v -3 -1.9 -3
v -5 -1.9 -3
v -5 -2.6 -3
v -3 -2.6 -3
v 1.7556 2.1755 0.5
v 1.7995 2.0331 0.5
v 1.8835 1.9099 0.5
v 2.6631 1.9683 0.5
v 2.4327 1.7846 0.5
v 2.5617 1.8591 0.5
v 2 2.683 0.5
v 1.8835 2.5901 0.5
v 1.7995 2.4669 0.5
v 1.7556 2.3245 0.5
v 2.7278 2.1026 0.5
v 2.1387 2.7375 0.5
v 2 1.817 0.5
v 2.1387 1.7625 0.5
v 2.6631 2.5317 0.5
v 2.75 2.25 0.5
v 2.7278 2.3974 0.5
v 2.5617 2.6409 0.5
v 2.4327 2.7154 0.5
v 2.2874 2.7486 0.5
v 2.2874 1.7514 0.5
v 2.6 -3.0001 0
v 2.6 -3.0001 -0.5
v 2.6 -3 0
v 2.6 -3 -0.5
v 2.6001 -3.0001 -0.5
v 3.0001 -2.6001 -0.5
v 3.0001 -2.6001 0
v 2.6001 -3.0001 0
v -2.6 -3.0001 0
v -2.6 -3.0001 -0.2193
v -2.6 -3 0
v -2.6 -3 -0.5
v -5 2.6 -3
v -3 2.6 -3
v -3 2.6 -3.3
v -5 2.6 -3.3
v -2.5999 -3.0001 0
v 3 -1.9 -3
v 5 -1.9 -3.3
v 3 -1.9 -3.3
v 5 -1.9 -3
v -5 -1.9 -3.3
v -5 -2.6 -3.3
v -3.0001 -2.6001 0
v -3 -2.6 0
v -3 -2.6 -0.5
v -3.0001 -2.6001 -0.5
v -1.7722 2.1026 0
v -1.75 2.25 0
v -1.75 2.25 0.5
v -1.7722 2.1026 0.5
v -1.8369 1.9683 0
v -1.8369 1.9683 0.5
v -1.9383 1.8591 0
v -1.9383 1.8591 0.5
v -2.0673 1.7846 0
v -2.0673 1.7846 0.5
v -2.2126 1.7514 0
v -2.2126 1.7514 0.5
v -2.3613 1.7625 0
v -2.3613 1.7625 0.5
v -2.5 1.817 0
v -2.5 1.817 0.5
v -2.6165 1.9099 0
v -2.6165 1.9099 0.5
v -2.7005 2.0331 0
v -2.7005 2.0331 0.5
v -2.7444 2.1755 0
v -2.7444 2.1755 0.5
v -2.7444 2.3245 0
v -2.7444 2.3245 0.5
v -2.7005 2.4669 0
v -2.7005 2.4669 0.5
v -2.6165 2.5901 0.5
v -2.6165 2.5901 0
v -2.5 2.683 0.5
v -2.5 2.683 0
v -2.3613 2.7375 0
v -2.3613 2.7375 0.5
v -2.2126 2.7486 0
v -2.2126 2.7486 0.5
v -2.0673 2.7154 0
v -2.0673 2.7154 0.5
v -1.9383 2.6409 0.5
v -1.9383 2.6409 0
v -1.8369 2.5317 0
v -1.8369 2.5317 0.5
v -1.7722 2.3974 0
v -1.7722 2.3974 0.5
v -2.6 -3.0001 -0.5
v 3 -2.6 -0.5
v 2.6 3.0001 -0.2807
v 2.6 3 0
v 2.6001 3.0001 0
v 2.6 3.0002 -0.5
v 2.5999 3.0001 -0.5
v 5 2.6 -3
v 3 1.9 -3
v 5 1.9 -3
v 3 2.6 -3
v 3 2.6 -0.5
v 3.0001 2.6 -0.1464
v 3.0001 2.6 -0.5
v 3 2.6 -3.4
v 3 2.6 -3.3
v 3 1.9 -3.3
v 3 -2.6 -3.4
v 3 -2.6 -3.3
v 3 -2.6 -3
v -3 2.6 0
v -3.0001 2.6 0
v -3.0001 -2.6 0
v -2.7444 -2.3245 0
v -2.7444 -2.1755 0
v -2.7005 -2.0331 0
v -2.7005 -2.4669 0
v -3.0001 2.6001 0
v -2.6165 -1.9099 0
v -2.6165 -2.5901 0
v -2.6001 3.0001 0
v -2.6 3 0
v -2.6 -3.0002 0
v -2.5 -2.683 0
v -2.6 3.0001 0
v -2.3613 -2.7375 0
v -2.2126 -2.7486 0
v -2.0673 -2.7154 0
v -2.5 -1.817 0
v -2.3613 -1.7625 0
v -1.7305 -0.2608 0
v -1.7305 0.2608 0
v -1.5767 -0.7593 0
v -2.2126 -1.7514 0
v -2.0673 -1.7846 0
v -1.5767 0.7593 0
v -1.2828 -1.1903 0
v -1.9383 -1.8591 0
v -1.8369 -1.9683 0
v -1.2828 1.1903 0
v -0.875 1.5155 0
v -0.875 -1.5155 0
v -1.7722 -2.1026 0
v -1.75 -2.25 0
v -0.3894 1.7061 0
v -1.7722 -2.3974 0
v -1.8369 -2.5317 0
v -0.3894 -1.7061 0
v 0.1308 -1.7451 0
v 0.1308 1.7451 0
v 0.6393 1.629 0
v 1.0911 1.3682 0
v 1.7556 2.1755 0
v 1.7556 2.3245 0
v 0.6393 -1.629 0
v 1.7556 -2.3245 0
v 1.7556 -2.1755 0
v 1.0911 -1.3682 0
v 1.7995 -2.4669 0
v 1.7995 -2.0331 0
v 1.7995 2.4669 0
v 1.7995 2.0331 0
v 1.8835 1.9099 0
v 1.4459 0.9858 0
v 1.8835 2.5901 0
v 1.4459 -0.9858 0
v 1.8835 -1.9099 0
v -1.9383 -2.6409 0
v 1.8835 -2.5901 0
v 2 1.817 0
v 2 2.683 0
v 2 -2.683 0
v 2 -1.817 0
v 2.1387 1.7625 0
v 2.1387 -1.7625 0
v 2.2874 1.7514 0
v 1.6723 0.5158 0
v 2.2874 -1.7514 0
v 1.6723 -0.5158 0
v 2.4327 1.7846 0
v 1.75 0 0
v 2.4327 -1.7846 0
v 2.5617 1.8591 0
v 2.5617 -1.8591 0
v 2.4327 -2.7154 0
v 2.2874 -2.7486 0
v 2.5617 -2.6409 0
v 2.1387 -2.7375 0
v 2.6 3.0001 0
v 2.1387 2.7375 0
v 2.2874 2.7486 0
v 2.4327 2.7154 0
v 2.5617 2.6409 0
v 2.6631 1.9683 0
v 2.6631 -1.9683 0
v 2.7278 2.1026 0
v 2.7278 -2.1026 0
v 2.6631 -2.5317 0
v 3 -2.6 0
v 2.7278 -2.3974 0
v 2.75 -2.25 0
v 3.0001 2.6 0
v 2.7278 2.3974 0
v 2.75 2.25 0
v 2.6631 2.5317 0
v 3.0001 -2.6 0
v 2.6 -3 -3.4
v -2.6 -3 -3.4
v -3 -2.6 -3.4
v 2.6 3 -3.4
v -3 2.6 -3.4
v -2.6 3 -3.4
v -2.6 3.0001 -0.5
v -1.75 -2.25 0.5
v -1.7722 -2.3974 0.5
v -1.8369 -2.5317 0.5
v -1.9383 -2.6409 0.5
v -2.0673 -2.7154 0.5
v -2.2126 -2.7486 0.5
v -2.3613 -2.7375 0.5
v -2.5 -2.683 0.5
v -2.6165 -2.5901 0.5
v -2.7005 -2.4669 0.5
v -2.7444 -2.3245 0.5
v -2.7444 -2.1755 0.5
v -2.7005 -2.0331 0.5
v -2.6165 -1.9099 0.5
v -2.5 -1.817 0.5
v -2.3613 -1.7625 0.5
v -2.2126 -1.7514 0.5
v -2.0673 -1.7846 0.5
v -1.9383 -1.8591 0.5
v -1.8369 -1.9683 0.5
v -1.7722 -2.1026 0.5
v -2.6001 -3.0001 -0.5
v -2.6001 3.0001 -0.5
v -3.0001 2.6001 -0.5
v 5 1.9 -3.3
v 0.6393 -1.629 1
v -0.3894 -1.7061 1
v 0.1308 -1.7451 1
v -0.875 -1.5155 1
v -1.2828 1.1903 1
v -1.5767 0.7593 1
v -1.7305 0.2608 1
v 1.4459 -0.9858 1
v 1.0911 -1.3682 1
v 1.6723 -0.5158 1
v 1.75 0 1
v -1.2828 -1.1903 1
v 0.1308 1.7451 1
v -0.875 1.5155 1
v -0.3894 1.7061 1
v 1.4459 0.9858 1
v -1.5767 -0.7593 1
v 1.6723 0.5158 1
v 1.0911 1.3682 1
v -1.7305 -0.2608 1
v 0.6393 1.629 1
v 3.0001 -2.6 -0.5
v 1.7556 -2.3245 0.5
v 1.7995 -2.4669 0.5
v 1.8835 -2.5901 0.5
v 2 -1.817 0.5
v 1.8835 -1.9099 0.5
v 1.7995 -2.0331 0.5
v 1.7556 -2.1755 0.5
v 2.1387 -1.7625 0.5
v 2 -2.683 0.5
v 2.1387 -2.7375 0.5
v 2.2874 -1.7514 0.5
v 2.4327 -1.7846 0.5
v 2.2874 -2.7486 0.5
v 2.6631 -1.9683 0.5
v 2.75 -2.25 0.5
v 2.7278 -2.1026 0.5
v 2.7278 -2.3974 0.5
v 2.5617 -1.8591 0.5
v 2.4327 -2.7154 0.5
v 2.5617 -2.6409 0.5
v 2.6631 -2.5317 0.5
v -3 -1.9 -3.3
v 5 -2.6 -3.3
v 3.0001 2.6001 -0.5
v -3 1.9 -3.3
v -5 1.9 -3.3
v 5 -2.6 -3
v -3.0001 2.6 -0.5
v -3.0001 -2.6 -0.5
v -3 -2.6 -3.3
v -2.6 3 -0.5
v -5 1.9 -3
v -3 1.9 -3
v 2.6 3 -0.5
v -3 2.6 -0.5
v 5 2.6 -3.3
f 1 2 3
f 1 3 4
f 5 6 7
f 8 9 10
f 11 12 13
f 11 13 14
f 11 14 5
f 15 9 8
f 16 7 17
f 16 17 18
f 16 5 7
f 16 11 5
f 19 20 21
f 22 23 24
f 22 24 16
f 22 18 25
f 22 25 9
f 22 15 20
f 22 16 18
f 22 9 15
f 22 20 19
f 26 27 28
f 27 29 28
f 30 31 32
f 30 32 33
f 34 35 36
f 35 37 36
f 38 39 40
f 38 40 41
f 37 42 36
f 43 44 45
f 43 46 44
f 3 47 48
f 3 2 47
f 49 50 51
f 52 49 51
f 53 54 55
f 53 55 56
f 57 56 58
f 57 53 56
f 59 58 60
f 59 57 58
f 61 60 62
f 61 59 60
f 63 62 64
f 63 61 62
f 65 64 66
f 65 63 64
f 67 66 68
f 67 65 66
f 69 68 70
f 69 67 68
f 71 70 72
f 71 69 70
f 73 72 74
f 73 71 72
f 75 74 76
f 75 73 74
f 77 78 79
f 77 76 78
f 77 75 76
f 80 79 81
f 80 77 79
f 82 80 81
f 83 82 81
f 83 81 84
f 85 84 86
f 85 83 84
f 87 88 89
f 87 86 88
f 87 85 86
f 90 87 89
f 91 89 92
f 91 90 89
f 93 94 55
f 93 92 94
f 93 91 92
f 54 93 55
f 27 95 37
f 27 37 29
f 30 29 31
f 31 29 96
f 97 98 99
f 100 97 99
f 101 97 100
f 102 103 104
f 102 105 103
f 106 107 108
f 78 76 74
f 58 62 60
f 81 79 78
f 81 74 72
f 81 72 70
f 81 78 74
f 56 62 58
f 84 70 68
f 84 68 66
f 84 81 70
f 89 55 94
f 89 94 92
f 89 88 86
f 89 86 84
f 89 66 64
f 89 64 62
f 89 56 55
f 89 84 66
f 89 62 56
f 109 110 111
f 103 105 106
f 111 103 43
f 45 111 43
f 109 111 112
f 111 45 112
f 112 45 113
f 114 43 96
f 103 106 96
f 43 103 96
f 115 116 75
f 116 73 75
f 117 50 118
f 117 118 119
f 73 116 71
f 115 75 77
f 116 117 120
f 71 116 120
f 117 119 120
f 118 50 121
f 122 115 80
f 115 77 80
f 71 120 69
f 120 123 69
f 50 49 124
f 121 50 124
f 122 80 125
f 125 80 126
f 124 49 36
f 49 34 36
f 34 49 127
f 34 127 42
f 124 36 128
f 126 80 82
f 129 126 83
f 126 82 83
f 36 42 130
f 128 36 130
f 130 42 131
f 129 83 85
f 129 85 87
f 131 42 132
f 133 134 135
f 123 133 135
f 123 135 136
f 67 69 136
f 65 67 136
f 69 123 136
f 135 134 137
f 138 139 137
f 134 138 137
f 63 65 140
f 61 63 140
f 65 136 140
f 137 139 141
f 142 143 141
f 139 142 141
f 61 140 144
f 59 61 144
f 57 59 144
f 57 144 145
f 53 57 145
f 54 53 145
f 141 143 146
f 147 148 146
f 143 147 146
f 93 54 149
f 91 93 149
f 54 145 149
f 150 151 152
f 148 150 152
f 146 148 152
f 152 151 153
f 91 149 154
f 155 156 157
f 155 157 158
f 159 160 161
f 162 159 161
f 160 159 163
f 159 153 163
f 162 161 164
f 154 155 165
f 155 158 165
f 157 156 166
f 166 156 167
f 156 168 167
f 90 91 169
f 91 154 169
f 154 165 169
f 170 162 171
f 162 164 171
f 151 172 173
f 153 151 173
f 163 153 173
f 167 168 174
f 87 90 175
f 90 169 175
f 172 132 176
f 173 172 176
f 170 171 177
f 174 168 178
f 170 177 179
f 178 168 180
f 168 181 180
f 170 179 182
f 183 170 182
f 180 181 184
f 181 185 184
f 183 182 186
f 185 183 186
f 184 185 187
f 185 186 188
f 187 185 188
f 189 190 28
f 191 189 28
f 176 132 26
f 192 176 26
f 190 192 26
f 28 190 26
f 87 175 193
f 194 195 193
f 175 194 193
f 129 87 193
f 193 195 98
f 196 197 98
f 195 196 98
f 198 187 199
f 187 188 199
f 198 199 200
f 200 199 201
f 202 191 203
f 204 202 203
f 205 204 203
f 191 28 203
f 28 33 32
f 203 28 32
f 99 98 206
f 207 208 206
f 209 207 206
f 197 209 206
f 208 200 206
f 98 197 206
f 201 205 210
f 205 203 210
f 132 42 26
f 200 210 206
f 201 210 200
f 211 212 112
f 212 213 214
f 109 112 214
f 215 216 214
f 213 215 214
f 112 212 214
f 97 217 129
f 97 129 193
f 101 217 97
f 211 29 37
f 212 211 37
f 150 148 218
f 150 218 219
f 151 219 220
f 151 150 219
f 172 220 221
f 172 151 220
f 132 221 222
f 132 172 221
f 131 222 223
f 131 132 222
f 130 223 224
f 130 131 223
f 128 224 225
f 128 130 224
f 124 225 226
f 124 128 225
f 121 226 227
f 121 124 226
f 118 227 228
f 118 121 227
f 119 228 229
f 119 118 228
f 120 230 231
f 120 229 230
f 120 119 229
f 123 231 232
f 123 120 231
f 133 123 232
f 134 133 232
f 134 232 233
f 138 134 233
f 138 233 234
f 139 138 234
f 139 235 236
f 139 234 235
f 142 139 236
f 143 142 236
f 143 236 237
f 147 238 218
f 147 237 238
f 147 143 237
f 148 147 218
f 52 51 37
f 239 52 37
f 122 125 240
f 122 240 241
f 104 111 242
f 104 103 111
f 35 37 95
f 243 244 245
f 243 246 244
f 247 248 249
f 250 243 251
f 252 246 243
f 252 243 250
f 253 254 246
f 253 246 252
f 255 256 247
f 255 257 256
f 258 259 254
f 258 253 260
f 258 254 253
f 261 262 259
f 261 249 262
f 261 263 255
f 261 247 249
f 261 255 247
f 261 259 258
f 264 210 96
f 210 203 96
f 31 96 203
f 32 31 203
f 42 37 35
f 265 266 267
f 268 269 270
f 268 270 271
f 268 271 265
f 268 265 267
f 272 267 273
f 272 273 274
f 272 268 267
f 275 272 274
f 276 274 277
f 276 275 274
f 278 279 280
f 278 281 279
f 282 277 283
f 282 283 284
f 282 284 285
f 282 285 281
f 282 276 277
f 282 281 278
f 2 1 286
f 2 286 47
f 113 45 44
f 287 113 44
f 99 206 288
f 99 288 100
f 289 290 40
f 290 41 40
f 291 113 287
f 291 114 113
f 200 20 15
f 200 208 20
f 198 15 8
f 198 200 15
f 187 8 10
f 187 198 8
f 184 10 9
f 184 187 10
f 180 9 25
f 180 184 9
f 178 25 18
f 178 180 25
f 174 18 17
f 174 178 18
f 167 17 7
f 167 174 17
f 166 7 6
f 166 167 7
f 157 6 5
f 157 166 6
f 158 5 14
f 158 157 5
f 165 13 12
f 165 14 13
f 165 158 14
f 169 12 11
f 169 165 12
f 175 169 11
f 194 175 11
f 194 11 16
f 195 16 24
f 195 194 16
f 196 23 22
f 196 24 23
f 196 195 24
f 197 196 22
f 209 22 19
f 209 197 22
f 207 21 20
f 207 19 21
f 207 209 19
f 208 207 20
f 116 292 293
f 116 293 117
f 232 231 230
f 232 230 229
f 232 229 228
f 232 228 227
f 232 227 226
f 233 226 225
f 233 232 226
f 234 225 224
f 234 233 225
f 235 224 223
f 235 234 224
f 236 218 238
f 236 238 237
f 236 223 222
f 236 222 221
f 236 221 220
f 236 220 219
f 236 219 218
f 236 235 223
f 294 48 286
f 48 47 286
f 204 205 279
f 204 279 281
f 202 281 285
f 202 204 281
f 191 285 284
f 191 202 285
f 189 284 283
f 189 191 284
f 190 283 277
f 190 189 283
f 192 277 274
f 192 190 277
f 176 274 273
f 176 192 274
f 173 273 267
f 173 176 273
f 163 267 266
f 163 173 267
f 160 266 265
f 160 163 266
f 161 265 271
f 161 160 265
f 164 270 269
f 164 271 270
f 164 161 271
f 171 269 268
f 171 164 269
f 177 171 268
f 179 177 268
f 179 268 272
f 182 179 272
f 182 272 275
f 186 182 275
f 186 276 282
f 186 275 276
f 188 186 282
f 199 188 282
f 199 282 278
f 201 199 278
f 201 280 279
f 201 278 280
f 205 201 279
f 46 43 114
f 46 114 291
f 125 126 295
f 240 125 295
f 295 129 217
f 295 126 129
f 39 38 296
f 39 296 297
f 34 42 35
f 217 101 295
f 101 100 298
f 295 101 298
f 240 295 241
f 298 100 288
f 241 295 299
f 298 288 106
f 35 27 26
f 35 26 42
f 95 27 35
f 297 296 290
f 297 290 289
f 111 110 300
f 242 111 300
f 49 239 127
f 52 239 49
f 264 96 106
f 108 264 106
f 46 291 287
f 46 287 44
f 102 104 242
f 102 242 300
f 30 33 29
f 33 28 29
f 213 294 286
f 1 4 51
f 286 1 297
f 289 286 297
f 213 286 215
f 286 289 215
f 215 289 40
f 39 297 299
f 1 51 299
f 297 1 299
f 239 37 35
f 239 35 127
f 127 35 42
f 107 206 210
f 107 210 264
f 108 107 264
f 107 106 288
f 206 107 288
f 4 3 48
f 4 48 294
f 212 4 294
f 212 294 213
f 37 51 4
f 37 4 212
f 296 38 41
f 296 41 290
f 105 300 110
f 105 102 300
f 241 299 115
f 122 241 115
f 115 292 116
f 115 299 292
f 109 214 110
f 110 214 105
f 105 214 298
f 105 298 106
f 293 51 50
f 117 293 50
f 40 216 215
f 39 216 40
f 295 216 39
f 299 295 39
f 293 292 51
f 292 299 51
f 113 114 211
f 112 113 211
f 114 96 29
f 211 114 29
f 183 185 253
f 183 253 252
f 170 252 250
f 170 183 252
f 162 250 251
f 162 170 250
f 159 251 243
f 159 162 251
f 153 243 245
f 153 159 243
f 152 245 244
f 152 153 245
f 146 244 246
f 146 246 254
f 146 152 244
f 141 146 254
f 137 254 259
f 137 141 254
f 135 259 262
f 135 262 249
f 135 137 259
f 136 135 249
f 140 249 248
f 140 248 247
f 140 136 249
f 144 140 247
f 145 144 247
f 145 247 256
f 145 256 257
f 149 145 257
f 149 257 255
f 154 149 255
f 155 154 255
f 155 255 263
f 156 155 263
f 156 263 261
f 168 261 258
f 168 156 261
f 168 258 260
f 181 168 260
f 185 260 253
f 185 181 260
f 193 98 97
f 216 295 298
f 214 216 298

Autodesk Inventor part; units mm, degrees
ref_plane "YZ Plane" through (0, 0, 0) normal (1, 0, 0) x (0, 1, 0)
ref_plane "XZ Plane" through (0, 0, 0) normal (0, 1, 0) x (-1, 0, 0)
sketch "Boceto1" plane through (0, 0, 0) normal (0, 0, 1) x (1, 0, 0)
  line L0 (-7.8, 0) -> (4.8, 0) projected
  line L1 (0, -4.2) -> (0, 4.2) projected
  line L2 (-2.6, 3) -> (2.6, 3)
  line L3 (3, 2.6) -> (3, -2.6)
  line L4 (2.6, -3) -> (-2.6, -3)
  line L5 (-3, -2.6) -> (-3, 2.6)
  circle A0 centre (-2.25, 2.25) radius 0.5
  circle A1 centre (-2.25, -2.25) radius 0.5
  circle A2 centre (2.25, 2.25) radius 0.5
  circle A3 centre (2.25, -2.25) radius 0.5
  circle A4 centre (0, 0) radius 1.75
  line L6 (-2.6, 3) -> (-3, 2.6)
  line L7 (2.6, 3) -> (3, 2.6)
  line L8 (3, -2.6) -> (2.6, -3)
  line L9 (-3, -2.6) -> (-2.6, -3)
  point P0 (-3, 3)
  point P1 (3, -3)
  point P2 (3, 3)
  point P3 (-3, -3)
  dimension "d0" = 6
  dimension "d1" = 6
  dimension "d2" = 4.5
  dimension "d4" = 4.5
  dimension "d5" = 1
  dimension "d6" = 3.5
  dimension "d7" = 0.4
  dimension "d8" = 0.4
  dimension "d9" = 0.4
  dimension "d10" = 0.4
  dimension "d11" = 0.4
  dimension "d12" = 0.4
  dimension "d13" = 0.4
  dimension "d14" = 0.4
extrude "Extrusión1" add sketch "Boceto1" against normal blind 3.4 contours L5 L6 L2 L1 A4 L0 | L0 A4 L1 L4 L9 L5 | A4 L1 L0 | L0 L1 A4 | L1 A4 L0 | L0 A4 L1 | L1 L2 L7 L3 L0 A4 | A4 L0 L3 L8 L4 L1 | A0 | A1 | A2 | A3
extrude "Extrusión2" add sketch "Boceto1" along normal blind 0.5 contours A0 | A1 | A2 | A3
extrude "Extrusión3" add sketch "Boceto1" along normal blind 1 contours A4 L1 L0 | L0 L1 A4 | L1 A4 L0 | L0 A4 L1
ref_plane "Plano de trabajo1" through (0, 0, -3) normal (0, 0, 1) x (1, 0, 0)
sketch "Boceto2" plane through (0, 0, -3) normal (0, 0, 1) x (1, 0, 0)
  line L0 (-3, 2.6) -> (-2.6, 3) projected
  line L1 (-2.6, 3) -> (2.6, 3) projected
  line L2 (2.6, 3) -> (3, 2.6) projected
  line L3 (3, 2.6) -> (3, -2.6) projected
  line L4 (3, -2.6) -> (2.6, -3) projected
  line L5 (2.6, -3) -> (-2.6, -3) projected
  line L6 (-2.6, -3) -> (-3, -2.6) projected
  line L7 (-3, -2.6) -> (-3, 2.6) projected
  line L8 (-3, 2.6) -> (-5, 2.6)
  line L9 (-5, 2.6) -> (-5, 1.9)
  line L10 (-5, 1.9) -> (-3, 1.9)
  line L11 (-3, 1.9) -> (-3, 2.6)
  line L12 (-5, 2.25) -> (-3, 2.25)
  line L13 (-7.8, 0) -> (4.8, 0) projected
  line L14 (0, -4.2) -> (0, 4.2) projected
  line L15 (-3, -1.9) -> (-5, -1.9)
  line L16 (-5, -1.9) -> (-5, -2.6)
  line L17 (-5, -2.6) -> (-3, -2.6)
  line L18 (-3, -2.6) -> (-3, -1.9)
  line L19 (5, 2.6) -> (3, 2.6)
  line L20 (3, 2.6) -> (3, 1.9)
  line L21 (3, 1.9) -> (5, 1.9)
  line L22 (5, 1.9) -> (5, 2.6)
  line L23 (5, -1.9) -> (3, -1.9)
  line L24 (3, -1.9) -> (3, -2.6)
  line L25 (3, -2.6) -> (5, -2.6)
  line L26 (5, -2.6) -> (5, -1.9)
  point P0 (0, 0)
  point P1 (-5, -2.25)
  point P2 (-3, -2.25)
  point P3 (3, 2.25)
  point P4 (5, 2.25)
  point P5 (3, -2.25)
  point P6 (5, -2.25)
  dimension "d22" = 2
  dimension "d23" = 0.7
  dimension "d24" = 0.75
  dimension "d27" = 4.5
  dimension "d30" = 8
extrude "Extrusión4" add sketch "Boceto2" against normal blind 0.3 contours L7 L12 L9 L8 | L7 L10 L9 L12 | L19 L22 L21 L3 | L7 L17 L16 L15 | L23 L26 L25 L3
sketch "Boceto3" plane through (-2.6, 3, 0) normal (0, 1, 0) x (1, 0, 0)
  line L0 (5.2, 0) -> (0, 0) projected
  line L1 (5.2, 0) -> (5.2, 3.4) projected
  line L2 (0, 3.4) -> (5.2, 3.4) projected
  line L3 (0, 0) -> (0, 3.4) projected
  line L4 (5.2, 0.5) -> (0, 0.5)
  line L5 (0, 0) -> (0, 3.4) projected
  point P0 (2.6, 0)
  dimension "d35" = 0.5
extrude "Extrusión5" add sketch "Boceto3" along normal blind 0.0001 contours L0 L3 L4 L1
mirror "Simetría1" about plane through (0, 0, 0) normal (0, 1, 0) of "Extrusión5"
sketch "Boceto4" plane through (3, -2.6, 0) normal (1, 0, 0) x (0, 0, -1)
  line L0 (3.3, 5.2) -> (3.3, 4.5) projected
  line L1 (3.3, 4.5) -> (3, 4.5) projected
  line L2 (3, 4.5) -> (3, 5.2) projected
  line L3 (0, 5.2) -> (3, 5.2) projected
  line L4 (0, 0) -> (0, 5.2) projected
  line L5 (0, 0) -> (3, 0) projected
  line L6 (3, 0) -> (3, 0.7) projected
  line L7 (3, 0.7) -> (3.3, 0.7) projected
  line L8 (3.3, 0.7) -> (3.3, 0) projected
  line L9 (3.3, 0) -> (3.4, 0) projected
  line L10 (3.4, 5.2) -> (3.4, 0) projected
  line L11 (3.3, 5.2) -> (3.4, 5.2) projected
  line L12 (0.5, 0) -> (0.5, 5.2)
  point P0 (0, 2.6)
  dimension "d38" = 0.5
extrude "Extrusión6" add sketch "Boceto4" along normal blind 0.0001 contours L12 L5 L4 L3
mirror "Simetría2" about plane through (0, 0, 0) normal (1, 0, 0) of "Extrusión6"
sketch "Boceto5" plane through (3, -2.6, -3) normal (0.7071, -0.7071, 0) x (-0.7071, -0.7071, 0)
  line L0 (0.5657, -2.5) -> (0, -2.5)
  line L1 (0, -2.5) -> (0, -3)
  line L2 (0, -3) -> (0, -2.5) projected
  line L3 (0, -3) -> (0.5657, -3)
  line L4 (0.5657, -3) -> (0, -3) projected
  line L5 (0.5657, -3) -> (0.5657, -2.5)
  line L6 (0.5657, -3) -> (0.5657, -2.5) projected
  point P0 (0.2828, -3)
extrude "Extrusión7" add sketch "Boceto5" along normal blind 0.0001
sketch "Boceto6" plane through (3, 2.6, -3.3) normal (0.7071, 0.7071, 0) x (-0.7071, 0.7071, 0)
  line L0 (-0.0001, 3.3) -> (0.5657, 3.3)
  line L1 (0.5657, 3.3) -> (0, 3.3) projected
  line L2 (0.5658, 3.3) -> (0.5658, 2.8) projected
  line L3 (0.5657, 3.3) -> (0.5658, 2.8)
  line L4 (0.5658, 2.8) -> (0, 2.8)
  line L5 (0, 2.8) -> (-0.0001, 3.3)
  point P0 (0.2828, 3.3)
extrude "Extrusión8" add sketch "Boceto6" along normal blind 0.0001
sketch "Boceto7" plane through (-3, -2.6, -3) normal (-0.7071, -0.7071, 0) x (-0.7071, 0.7071, 0)
  line L0 (0, -2.5) -> (-0.5657, -2.5)
  line L1 (-0.5658, -2.5) -> (-0.5658, -3) projected
  line L2 (-0.5657, -2.5) -> (-0.5658, -3)
  line L3 (-0.5658, -3) -> (0, -3)
  line L4 (0, -3) -> (-0.5657, -3) projected
  line L5 (0, -3) -> (0, -2.5)
  point P0 (-0.2828, -3)
extrude "Extrusión9" add sketch "Boceto7" along normal blind 0.0001
sketch "Boceto8" plane through (-3, 2.6, -3.3) normal (-0.7071, 0.7071, 0) x (-0.7071, -0.7071, 0)
  line L0 (0, 3.3) -> (-0.5657, 3.3)
  line L1 (-0.5657, 3.3) -> (0, 3.3) projected
  line L2 (-0.5657, 3.3) -> (-0.5657, 2.8)
  line L3 (-0.5657, 2.8) -> (0, 2.8)
  line L4 (-0.5657, 2.8) -> (0, 2.8) projected
  line L5 (0, 2.8) -> (0, 3.3)
  line L6 (0, 3.3) -> (0, 2.8) projected
  point P0 (-0.2828, 3.3)
extrude "Extrusión10" add sketch "Boceto8" along normal blind 0.0001
equation "\"d10\" = d9"
properties part number "PZ_PushButton"
